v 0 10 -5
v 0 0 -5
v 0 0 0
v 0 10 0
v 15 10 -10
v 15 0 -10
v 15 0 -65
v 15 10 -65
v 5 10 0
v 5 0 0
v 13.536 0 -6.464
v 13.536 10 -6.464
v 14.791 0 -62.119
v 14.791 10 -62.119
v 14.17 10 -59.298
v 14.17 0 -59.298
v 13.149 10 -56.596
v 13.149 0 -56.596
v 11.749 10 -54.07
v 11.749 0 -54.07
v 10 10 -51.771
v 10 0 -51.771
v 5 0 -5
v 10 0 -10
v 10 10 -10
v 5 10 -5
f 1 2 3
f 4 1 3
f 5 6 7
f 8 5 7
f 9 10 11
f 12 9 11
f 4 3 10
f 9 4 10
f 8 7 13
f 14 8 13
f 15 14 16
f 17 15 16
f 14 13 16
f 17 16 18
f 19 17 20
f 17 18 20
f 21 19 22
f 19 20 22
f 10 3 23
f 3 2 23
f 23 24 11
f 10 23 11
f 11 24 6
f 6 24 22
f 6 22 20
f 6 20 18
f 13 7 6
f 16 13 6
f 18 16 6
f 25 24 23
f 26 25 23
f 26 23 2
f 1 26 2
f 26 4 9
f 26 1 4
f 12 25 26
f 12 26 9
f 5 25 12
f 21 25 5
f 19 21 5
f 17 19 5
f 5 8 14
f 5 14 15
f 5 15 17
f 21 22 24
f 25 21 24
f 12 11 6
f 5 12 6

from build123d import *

# Parameters (mm, degrees)
BOSS_EXTRUDE1_DEPTH = 10


with BuildPart() as part:
    # Sketch1 → Boss-Extrude1 (new body)
    with BuildSketch(Plane(origin=(0, 0, 0), x_dir=(1, 0, 0), z_dir=(0, 1, 0))):
        with BuildLine():
            Line((0, 0), (5, 0))
            Line((5, 0), (13.535533906, 6.464466094))
            Line((13.535533906, 6.464466094), (15, 10))
            Line((15, 10), (15, 65))
            ThreePointArc((15, 65), (13.708286934, 57.928932188), (10, 51.771243445))
            Line((10, 51.771243445), (10, 20))
            Line((10, 20), (10, 10))
            Line((10, 10), (5, 5))
            Line((5, 5), (0, 5))
            Line((0, 5), (0, 0))
        make_face()
    extrude(amount=BOSS_EXTRUDE1_DEPTH)


solid = part.part
